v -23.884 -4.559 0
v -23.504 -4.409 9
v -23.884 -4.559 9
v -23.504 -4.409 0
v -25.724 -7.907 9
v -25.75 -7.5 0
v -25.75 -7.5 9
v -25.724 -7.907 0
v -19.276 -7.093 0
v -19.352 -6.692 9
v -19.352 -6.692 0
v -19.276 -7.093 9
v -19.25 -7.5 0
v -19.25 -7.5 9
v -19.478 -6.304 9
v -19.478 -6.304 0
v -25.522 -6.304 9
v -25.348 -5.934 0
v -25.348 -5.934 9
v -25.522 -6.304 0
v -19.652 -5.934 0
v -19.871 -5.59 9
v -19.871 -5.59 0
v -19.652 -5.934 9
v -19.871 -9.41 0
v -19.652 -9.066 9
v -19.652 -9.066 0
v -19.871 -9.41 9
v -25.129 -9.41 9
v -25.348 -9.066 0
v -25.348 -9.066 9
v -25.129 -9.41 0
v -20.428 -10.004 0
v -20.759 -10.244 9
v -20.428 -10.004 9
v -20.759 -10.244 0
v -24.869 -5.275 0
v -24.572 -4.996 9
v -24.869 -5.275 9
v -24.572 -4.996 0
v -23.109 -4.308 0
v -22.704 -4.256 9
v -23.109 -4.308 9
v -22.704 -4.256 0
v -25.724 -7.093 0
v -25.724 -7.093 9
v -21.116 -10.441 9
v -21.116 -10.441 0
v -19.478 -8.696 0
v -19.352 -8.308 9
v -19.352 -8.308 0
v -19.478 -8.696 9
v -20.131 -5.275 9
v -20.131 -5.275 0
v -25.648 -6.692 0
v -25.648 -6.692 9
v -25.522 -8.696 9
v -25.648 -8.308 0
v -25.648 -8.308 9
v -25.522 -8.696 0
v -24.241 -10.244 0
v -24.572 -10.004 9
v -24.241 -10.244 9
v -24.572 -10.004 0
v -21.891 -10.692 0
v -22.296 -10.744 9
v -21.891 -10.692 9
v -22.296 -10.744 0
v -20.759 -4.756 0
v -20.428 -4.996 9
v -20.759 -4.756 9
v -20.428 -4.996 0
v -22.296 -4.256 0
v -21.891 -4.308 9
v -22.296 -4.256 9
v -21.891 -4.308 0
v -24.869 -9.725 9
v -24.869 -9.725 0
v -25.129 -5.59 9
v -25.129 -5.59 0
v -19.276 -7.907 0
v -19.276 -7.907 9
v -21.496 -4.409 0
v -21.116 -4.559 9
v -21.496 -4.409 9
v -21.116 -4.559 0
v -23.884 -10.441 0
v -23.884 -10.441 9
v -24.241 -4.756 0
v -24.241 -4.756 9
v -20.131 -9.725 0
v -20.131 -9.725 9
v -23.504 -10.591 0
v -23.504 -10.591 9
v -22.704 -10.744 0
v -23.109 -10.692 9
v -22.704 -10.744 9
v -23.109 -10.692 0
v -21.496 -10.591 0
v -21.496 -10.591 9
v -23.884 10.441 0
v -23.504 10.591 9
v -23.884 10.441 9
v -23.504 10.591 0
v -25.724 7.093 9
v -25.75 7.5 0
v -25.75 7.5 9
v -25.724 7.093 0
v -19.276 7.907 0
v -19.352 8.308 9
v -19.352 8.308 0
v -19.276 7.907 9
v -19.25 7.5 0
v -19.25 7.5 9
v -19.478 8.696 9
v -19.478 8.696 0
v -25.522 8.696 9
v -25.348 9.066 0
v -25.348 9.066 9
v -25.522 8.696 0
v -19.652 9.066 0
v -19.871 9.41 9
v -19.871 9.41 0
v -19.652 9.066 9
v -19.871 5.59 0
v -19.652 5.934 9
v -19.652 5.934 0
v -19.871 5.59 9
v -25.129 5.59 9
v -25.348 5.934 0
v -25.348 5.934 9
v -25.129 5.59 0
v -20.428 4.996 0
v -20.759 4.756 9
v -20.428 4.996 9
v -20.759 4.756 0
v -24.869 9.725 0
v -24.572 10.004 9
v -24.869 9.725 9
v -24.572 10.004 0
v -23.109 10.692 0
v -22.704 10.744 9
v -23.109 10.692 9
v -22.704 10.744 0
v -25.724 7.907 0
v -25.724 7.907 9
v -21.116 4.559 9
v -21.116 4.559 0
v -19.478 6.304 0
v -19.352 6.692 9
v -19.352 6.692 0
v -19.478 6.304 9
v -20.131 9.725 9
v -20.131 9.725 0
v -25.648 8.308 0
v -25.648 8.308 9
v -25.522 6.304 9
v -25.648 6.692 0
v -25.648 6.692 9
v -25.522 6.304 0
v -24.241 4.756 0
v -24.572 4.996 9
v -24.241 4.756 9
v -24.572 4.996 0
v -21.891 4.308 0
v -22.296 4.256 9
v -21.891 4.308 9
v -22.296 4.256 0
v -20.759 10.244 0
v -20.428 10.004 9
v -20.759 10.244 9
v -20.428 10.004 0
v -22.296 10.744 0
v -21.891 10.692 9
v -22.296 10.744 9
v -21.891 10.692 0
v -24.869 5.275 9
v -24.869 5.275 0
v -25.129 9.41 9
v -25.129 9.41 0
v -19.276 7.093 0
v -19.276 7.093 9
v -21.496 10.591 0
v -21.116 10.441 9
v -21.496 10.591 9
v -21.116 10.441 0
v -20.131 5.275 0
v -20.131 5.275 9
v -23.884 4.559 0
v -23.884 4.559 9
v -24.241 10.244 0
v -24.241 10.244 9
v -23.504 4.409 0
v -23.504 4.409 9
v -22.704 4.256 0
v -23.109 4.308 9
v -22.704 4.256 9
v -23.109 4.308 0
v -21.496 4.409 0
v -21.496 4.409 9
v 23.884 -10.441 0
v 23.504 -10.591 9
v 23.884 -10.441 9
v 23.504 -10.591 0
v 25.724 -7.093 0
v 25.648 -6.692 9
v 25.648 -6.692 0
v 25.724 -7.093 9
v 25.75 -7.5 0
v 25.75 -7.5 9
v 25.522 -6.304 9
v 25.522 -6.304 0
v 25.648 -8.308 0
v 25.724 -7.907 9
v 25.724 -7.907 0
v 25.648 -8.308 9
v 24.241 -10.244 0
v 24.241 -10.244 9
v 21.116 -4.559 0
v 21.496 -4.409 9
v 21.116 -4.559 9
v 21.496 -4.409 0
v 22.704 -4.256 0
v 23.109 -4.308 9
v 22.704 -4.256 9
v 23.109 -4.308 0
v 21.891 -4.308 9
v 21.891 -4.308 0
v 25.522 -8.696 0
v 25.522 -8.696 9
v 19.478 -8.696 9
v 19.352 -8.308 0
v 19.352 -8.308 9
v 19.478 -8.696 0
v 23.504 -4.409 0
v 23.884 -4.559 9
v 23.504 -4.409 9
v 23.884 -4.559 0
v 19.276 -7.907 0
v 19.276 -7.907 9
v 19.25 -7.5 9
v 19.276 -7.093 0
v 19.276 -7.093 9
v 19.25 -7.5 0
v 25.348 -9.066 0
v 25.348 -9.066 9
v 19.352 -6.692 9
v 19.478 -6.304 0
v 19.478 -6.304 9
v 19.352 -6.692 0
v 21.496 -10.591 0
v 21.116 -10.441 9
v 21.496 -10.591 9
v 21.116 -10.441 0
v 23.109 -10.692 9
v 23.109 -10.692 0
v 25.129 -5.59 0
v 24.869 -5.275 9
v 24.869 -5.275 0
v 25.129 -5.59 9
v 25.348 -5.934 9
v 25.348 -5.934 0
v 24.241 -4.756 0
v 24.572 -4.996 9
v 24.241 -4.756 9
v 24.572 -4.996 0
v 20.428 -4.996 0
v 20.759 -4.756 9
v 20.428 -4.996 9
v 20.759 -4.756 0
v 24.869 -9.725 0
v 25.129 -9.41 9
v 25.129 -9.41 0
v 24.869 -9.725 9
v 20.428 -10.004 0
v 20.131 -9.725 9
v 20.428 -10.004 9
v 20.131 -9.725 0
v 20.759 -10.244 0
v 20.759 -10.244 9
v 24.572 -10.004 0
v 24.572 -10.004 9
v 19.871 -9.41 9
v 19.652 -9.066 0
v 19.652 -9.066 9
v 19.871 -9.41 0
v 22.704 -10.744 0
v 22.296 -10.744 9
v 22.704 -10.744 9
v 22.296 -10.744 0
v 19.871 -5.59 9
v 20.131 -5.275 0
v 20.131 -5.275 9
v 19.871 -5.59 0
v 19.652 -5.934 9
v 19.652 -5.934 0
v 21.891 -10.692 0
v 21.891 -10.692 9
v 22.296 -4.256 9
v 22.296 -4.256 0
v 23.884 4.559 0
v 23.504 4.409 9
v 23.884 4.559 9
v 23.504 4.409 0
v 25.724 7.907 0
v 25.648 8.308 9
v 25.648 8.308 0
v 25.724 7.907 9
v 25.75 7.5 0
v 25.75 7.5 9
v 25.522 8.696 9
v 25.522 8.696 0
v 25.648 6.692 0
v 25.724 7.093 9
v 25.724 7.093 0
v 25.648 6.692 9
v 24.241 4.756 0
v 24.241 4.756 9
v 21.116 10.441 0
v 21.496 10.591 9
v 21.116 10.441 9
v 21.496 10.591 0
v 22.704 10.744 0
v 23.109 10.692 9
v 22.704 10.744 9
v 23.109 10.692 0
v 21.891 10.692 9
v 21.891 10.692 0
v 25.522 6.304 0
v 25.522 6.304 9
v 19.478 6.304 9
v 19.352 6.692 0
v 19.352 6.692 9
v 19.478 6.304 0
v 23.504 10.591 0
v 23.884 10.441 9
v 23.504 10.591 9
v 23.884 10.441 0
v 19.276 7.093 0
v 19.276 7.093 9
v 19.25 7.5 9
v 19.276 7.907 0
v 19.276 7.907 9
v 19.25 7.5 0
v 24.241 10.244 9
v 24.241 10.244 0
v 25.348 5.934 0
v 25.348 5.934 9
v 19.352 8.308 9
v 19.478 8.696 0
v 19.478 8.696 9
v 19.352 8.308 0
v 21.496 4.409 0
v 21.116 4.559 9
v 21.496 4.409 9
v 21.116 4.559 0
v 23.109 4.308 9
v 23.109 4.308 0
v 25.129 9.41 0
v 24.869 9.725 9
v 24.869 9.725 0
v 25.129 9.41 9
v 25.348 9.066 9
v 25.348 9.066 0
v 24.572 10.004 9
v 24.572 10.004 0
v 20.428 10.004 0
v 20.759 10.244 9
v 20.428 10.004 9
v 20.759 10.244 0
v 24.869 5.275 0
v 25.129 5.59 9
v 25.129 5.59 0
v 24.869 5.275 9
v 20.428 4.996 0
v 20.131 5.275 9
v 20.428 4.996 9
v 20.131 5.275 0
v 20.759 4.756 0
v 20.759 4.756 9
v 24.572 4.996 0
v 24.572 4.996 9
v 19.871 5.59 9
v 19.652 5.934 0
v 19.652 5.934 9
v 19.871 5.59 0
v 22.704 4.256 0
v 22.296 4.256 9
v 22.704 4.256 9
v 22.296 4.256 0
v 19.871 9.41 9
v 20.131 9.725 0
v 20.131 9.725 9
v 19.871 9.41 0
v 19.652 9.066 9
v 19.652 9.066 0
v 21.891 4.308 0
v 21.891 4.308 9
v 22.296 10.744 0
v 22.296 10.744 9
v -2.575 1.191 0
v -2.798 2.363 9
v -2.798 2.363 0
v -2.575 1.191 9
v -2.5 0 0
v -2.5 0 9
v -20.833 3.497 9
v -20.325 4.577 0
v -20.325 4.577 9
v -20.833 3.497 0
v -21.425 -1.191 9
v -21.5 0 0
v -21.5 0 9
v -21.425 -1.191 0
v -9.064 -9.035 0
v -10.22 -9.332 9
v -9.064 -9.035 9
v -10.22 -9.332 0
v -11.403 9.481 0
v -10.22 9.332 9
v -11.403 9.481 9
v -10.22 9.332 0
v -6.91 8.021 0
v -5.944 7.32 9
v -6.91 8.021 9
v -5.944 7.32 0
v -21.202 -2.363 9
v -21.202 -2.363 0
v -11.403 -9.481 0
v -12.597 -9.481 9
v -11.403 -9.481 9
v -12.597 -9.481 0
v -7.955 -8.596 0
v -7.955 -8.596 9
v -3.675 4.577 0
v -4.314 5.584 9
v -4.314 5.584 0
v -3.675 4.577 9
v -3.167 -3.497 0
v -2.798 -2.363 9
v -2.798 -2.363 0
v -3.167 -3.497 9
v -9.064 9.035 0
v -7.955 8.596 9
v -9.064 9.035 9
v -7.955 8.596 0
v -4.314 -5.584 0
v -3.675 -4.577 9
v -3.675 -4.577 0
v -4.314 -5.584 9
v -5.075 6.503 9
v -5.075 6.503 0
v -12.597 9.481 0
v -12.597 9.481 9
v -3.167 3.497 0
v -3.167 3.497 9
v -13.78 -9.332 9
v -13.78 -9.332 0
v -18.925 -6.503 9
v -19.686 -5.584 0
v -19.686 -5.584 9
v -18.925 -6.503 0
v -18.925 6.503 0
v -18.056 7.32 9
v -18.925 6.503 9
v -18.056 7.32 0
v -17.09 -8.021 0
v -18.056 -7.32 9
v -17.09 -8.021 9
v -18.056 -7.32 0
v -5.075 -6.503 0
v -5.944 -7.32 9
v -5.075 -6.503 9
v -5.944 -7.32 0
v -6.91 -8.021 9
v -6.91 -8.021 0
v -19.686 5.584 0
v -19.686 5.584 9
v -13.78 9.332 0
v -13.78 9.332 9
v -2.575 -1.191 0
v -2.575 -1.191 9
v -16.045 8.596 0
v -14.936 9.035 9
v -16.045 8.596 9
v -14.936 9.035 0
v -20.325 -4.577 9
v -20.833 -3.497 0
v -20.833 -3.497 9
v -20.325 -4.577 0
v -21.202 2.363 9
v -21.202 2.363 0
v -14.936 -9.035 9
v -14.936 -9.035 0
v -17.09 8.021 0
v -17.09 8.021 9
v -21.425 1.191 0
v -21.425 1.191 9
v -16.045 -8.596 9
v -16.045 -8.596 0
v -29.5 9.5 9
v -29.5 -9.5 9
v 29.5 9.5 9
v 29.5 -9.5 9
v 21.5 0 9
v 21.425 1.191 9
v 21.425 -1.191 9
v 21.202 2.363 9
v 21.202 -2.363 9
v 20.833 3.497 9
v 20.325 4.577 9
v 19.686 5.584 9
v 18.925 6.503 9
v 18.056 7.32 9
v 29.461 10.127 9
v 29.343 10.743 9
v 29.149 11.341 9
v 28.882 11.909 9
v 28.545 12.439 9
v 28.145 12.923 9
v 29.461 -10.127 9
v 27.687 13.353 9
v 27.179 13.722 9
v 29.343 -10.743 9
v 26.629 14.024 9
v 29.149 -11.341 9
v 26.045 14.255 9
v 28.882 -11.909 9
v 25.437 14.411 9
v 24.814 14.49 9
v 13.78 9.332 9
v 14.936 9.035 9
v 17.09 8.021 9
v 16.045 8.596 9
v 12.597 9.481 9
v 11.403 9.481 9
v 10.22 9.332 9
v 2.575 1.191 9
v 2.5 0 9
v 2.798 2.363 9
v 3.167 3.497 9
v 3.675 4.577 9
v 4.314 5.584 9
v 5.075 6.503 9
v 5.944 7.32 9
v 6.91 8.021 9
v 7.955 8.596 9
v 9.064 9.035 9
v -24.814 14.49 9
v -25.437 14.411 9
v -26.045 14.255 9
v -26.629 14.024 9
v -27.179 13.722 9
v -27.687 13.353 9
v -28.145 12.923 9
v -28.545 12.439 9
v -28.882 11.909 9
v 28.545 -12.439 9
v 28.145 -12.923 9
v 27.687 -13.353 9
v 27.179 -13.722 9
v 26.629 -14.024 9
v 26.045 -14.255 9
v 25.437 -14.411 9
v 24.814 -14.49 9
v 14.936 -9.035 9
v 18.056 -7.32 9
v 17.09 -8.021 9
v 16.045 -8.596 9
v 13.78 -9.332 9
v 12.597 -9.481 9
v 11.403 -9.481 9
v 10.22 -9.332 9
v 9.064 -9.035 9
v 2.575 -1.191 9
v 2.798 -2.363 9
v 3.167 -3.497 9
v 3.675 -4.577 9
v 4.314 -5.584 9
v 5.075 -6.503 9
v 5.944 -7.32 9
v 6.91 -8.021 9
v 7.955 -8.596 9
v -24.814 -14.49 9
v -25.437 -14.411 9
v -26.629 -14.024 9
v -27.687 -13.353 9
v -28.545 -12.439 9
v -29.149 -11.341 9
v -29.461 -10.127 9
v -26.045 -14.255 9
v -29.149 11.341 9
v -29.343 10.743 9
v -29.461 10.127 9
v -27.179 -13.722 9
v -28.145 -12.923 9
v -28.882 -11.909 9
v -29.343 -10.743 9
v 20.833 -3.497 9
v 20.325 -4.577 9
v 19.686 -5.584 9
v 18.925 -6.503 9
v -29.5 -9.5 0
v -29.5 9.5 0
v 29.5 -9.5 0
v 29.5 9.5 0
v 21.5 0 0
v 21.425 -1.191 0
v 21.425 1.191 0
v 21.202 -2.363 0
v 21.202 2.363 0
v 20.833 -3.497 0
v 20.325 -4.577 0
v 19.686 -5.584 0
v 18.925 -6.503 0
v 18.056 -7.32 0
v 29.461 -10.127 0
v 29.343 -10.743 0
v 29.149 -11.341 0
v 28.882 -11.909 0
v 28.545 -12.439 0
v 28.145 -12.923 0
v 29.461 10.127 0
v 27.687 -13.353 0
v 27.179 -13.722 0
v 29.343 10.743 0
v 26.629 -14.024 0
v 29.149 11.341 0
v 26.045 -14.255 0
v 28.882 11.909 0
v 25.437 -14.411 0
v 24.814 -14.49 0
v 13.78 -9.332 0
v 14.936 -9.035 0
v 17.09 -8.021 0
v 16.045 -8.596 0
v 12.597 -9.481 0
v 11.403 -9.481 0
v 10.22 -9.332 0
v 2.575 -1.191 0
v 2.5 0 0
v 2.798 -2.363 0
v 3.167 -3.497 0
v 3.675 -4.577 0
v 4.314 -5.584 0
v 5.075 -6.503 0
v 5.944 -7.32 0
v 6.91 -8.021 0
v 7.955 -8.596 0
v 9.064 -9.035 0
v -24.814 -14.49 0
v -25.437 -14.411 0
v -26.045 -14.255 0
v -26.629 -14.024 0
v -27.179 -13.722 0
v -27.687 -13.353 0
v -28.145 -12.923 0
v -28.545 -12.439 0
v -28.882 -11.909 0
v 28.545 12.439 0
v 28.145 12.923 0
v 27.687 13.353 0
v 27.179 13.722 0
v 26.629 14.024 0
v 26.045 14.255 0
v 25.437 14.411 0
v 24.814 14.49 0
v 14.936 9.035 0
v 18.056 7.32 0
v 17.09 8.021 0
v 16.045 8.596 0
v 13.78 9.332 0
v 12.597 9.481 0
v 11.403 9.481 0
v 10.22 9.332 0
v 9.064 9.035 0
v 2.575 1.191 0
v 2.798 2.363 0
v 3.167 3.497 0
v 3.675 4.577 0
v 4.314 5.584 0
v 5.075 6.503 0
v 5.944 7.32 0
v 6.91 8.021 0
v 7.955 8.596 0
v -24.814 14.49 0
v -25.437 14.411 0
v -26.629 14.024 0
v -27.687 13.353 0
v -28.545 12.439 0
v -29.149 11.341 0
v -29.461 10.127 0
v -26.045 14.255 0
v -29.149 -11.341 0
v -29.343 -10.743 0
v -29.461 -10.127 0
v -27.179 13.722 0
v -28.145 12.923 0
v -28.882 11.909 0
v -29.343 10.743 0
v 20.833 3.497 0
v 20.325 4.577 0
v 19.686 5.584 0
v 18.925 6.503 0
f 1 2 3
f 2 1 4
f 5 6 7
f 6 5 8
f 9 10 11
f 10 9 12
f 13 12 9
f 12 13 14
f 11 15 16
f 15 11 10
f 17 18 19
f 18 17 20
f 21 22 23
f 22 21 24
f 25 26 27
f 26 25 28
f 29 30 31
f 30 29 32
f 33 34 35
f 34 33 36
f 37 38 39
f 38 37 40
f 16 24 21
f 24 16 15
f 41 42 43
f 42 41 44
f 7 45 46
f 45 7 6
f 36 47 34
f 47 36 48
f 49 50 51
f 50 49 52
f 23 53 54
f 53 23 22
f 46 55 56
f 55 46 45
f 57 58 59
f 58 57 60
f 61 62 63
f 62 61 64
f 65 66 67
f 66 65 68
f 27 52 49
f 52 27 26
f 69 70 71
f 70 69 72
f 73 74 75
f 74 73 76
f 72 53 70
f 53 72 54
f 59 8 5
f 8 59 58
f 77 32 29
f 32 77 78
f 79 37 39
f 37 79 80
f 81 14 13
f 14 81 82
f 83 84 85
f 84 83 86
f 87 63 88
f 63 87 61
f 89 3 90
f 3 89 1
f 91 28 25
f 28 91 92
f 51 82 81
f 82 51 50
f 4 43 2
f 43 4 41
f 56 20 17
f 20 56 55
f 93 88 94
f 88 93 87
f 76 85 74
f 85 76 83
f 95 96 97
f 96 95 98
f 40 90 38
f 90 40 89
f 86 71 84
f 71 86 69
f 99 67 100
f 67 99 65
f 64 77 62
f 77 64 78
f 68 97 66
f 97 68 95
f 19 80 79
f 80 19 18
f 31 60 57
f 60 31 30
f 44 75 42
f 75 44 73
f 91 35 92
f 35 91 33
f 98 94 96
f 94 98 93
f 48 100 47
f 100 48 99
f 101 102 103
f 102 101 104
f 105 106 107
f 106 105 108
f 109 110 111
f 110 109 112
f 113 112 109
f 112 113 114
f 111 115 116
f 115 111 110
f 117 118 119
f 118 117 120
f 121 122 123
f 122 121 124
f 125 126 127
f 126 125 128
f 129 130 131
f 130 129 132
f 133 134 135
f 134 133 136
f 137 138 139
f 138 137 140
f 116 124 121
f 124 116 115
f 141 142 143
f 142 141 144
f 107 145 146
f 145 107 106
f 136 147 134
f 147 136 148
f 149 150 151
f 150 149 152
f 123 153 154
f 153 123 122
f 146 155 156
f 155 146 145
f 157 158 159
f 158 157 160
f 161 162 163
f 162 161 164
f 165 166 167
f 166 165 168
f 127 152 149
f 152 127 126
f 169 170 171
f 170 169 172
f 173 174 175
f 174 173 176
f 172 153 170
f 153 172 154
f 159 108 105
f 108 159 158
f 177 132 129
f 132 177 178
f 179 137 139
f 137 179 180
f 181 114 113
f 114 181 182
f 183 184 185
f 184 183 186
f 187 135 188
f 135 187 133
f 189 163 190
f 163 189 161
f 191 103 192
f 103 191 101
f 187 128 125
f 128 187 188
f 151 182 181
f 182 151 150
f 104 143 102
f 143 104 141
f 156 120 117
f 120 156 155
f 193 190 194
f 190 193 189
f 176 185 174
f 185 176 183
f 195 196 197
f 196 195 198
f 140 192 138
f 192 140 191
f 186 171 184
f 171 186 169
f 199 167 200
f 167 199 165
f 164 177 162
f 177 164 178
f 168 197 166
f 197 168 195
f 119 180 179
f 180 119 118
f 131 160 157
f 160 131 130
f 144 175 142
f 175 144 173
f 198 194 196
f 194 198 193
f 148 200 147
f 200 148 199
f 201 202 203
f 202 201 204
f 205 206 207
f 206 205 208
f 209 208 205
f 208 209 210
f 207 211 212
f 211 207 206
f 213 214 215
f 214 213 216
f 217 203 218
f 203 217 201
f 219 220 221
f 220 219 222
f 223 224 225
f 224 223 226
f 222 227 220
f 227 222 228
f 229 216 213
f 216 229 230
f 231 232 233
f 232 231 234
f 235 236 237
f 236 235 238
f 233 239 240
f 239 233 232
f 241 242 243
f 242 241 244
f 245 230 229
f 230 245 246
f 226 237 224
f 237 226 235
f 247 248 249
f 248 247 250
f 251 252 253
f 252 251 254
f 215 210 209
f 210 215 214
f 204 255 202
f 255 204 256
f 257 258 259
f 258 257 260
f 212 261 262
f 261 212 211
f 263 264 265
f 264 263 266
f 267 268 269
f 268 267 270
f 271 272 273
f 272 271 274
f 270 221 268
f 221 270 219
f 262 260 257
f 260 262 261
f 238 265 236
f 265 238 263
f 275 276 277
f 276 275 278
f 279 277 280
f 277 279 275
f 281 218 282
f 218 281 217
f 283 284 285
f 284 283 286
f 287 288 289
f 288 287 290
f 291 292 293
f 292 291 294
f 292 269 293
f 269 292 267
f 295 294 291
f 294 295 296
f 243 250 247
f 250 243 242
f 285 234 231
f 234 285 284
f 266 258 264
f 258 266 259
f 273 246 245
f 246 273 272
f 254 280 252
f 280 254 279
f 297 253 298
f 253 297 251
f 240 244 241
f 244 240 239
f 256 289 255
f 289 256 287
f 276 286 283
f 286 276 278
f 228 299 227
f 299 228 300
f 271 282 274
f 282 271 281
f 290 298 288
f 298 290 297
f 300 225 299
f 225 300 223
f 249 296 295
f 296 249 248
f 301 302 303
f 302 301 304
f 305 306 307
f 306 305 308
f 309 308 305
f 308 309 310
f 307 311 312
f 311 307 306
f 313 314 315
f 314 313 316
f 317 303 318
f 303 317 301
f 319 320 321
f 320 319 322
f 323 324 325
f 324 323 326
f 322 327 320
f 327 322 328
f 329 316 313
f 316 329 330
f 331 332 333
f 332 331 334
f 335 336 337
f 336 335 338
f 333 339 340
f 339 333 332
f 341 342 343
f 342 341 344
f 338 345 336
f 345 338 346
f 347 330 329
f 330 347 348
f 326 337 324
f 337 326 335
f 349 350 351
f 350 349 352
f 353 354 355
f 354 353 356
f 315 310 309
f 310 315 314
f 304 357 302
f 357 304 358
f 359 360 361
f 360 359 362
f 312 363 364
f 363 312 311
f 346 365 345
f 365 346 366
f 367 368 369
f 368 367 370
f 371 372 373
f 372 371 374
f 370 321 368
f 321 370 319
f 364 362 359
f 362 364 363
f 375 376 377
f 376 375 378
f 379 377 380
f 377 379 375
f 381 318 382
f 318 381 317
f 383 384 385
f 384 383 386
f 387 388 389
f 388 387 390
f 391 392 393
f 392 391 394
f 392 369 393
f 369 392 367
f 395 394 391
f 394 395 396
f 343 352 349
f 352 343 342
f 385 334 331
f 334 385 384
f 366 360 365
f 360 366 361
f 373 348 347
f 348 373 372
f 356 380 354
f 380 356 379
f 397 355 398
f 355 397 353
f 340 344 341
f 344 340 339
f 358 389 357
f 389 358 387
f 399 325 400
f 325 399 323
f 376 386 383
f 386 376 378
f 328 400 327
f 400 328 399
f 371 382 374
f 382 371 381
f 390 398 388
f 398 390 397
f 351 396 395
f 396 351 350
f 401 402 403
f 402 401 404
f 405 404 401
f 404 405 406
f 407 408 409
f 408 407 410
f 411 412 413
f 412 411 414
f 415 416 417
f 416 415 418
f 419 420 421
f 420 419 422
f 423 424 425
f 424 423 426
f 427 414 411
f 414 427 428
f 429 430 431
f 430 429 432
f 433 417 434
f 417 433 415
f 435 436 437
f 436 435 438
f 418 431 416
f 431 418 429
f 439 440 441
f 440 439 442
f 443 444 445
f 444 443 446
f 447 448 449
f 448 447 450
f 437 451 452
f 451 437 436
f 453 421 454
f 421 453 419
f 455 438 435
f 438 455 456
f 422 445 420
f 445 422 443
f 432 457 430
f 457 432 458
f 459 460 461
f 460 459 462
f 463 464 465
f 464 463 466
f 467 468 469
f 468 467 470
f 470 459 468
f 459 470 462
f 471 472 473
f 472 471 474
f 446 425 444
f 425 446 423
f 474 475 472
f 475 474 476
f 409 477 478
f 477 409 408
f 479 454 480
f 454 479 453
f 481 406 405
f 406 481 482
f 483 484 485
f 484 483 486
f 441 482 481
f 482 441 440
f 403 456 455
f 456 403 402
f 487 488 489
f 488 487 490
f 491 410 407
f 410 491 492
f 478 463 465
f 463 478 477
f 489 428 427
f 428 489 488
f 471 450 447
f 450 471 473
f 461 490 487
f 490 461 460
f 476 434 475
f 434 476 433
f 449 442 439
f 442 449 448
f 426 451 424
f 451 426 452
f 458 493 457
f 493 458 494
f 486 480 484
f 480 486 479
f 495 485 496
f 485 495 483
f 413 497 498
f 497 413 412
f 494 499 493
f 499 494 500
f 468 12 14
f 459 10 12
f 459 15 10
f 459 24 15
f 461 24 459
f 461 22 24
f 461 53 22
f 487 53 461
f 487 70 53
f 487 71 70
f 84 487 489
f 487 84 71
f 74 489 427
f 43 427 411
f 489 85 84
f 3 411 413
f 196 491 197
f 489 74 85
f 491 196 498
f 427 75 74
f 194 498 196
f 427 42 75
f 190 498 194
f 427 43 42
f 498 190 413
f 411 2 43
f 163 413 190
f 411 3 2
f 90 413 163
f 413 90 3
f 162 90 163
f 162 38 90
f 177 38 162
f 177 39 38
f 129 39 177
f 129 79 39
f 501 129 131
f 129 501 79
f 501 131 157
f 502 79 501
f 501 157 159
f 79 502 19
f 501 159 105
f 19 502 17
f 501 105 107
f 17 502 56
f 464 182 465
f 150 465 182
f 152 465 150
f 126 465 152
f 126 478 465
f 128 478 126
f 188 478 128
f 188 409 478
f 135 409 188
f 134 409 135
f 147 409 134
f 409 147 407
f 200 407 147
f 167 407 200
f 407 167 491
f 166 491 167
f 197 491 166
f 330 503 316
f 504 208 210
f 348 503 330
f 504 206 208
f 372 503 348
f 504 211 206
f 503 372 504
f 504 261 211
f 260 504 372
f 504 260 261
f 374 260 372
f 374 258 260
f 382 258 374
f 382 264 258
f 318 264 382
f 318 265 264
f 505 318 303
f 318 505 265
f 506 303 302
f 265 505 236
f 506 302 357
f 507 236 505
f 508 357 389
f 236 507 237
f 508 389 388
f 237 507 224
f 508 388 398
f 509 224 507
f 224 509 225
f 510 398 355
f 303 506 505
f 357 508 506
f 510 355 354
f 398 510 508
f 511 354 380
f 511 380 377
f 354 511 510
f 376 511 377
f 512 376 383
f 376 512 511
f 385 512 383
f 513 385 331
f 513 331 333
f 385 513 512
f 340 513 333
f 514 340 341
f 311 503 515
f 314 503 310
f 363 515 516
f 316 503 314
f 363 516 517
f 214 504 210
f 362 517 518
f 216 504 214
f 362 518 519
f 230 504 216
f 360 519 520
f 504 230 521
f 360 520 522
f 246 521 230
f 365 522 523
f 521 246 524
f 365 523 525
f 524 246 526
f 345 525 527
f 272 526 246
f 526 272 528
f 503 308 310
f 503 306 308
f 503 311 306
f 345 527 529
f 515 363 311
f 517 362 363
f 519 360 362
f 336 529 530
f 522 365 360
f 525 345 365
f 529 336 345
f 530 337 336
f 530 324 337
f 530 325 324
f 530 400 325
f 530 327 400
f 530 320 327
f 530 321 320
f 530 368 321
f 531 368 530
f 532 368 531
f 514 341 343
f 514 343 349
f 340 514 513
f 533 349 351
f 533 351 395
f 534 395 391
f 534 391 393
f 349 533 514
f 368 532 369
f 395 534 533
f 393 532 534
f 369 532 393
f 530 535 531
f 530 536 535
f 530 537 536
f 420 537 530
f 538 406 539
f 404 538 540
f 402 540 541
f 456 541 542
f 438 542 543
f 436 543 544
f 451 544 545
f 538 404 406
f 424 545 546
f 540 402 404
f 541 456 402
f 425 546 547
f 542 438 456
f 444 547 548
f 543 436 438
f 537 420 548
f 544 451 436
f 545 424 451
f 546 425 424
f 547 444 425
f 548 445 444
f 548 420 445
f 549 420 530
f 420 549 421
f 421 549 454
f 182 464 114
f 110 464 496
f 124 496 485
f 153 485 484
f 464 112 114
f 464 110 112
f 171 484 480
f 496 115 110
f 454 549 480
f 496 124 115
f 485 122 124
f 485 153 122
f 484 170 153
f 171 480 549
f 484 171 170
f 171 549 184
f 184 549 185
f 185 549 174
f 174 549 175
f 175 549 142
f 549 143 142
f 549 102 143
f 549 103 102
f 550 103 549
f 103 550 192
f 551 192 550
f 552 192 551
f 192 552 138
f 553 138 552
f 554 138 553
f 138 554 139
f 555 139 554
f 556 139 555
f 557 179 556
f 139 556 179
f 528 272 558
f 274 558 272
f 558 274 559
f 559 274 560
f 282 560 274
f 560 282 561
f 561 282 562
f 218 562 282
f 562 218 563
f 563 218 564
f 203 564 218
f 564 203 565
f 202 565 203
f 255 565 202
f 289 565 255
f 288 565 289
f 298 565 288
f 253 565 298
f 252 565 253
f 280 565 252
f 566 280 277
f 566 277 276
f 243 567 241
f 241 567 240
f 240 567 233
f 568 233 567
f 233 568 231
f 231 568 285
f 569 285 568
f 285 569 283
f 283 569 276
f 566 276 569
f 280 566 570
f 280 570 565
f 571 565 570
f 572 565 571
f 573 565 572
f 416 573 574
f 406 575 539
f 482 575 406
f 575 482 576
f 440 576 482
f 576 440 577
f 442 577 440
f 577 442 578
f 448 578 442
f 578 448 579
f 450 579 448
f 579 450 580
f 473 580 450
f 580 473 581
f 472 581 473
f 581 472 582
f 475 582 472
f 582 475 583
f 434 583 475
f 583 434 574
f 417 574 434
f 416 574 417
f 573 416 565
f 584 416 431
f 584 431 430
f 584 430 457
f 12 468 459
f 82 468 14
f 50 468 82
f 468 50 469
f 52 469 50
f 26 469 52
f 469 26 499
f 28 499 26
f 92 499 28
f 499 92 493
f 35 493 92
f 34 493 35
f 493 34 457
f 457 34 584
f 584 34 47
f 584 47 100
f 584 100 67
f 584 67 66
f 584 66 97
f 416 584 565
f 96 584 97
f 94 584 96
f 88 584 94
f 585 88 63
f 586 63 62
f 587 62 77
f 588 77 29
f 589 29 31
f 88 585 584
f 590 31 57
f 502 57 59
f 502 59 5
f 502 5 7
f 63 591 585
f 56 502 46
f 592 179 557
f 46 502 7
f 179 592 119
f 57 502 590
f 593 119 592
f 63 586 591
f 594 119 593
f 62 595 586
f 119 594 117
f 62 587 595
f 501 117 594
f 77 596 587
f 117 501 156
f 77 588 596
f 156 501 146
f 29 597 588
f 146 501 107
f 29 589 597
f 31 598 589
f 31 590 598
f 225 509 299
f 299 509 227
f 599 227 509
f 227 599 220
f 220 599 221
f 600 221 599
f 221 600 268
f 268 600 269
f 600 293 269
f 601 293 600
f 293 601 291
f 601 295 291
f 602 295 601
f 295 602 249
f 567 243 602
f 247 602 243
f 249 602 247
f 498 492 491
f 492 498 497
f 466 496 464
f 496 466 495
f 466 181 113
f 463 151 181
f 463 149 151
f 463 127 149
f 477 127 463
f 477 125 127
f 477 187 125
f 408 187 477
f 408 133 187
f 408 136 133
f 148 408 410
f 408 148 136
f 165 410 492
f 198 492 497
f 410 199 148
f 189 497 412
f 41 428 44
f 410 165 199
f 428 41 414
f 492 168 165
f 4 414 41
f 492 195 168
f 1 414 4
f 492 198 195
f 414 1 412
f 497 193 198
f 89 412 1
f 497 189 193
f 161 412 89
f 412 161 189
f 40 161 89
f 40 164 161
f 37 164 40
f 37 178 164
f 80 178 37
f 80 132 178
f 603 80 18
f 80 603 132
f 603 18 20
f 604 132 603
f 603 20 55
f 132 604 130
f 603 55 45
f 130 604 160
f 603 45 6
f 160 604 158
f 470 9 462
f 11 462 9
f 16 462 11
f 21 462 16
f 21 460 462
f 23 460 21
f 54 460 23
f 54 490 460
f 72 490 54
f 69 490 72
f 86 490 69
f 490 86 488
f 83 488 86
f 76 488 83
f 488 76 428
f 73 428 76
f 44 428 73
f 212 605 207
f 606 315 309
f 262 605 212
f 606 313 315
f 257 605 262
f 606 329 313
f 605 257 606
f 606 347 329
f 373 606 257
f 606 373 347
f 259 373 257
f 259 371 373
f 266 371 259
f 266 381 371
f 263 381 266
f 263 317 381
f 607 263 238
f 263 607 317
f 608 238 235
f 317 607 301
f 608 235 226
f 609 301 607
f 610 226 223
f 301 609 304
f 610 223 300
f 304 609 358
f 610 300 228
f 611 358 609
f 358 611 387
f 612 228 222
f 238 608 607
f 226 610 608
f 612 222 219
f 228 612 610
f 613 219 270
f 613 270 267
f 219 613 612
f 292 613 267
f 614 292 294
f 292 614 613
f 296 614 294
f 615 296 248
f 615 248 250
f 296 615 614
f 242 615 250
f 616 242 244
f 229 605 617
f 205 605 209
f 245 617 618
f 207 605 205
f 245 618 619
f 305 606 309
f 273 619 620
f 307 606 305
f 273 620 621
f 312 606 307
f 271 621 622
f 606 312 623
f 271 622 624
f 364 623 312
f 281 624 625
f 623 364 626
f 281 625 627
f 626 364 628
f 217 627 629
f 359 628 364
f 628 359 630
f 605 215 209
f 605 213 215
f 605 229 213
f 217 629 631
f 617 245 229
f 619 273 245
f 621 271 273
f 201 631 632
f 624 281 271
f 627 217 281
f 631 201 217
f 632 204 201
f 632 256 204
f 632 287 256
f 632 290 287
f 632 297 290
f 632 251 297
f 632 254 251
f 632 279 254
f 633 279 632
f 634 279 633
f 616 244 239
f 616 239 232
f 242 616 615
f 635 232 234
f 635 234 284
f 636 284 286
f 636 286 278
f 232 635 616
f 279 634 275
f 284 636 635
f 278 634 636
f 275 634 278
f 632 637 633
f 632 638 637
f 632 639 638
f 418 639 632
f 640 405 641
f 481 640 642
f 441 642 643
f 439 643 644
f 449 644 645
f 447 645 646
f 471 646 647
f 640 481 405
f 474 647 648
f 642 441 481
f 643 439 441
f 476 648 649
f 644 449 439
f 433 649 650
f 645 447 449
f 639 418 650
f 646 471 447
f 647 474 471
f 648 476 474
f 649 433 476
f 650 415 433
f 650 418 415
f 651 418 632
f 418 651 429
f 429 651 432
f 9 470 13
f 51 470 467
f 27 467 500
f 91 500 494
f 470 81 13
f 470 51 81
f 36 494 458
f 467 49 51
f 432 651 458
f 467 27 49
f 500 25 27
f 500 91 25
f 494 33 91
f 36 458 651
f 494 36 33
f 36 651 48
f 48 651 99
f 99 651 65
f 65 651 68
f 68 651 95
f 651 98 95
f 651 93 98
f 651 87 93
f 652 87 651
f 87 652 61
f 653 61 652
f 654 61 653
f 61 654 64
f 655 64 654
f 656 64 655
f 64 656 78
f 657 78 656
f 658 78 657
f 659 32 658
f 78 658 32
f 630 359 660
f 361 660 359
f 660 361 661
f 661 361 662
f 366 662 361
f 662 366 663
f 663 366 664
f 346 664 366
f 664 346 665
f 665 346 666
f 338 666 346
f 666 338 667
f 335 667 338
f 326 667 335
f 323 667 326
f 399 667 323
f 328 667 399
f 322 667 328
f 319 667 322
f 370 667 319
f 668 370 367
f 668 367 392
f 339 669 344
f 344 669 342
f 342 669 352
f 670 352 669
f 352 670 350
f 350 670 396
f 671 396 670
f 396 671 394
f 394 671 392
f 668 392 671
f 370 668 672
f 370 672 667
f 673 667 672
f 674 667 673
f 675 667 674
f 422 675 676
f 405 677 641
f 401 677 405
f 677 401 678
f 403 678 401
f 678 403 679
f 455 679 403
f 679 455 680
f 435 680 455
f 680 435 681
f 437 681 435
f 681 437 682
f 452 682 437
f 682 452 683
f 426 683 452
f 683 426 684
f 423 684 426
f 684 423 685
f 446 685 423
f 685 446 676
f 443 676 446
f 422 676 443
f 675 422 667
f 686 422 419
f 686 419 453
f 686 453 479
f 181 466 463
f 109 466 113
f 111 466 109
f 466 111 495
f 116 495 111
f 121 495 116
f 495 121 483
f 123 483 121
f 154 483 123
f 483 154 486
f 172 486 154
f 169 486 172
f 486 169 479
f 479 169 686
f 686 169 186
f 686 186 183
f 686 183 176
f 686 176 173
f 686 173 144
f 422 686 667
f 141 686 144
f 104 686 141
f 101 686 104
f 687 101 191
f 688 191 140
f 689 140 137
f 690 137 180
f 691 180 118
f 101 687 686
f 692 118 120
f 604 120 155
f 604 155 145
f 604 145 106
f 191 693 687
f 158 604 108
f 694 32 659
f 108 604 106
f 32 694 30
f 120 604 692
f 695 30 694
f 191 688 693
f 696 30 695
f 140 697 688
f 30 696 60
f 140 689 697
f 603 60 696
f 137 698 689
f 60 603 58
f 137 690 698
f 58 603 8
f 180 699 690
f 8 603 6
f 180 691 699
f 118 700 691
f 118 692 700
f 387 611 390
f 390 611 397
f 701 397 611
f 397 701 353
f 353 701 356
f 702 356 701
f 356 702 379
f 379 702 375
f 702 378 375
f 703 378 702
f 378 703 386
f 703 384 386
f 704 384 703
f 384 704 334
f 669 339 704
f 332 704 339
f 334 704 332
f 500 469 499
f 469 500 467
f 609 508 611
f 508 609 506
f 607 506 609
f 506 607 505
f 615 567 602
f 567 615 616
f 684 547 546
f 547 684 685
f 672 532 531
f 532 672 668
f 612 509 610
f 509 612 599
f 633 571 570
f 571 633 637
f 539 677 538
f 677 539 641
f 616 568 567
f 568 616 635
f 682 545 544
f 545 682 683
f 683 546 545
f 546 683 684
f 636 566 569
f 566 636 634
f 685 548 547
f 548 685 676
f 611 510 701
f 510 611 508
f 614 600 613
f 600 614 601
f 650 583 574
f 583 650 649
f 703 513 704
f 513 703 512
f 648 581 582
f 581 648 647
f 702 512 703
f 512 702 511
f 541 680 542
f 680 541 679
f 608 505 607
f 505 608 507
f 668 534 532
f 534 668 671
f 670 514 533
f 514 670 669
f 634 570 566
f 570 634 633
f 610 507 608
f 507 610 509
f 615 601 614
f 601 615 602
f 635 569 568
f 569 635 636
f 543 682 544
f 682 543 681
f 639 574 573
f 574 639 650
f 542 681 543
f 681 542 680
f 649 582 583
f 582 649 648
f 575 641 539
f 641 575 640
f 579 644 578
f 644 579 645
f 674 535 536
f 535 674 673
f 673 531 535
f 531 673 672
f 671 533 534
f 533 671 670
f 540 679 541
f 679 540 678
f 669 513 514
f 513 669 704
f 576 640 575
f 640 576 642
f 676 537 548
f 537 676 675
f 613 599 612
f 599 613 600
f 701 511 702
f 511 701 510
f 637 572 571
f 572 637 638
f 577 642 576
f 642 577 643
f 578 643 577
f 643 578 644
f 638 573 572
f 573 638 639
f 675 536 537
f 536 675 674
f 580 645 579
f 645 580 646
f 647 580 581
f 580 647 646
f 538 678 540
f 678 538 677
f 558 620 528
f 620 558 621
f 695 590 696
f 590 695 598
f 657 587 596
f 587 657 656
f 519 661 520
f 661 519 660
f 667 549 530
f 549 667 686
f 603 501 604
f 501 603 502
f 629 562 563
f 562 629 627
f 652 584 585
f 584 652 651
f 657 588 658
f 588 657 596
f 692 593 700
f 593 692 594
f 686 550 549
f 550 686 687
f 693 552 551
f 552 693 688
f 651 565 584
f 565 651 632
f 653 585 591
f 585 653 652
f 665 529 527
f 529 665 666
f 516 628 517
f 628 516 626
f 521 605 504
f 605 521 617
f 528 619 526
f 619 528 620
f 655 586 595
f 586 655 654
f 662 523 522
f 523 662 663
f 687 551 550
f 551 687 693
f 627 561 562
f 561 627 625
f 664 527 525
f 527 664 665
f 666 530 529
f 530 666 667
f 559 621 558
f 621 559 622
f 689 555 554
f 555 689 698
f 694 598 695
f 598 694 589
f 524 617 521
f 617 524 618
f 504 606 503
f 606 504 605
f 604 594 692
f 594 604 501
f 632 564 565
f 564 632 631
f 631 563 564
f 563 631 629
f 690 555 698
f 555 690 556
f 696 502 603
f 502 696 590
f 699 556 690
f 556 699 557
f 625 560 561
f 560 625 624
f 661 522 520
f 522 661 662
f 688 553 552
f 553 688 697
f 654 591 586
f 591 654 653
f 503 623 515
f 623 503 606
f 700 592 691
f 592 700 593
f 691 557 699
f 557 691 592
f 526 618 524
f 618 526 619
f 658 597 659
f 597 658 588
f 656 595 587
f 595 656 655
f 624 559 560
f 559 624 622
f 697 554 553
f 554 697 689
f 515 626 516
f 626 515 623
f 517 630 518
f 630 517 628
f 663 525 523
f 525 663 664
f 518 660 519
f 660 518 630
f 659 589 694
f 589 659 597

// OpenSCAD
$fn = 50;

difference() {
	union() {
		hull() {
			translate(v = [-24.5, 9.5, 0]) {
				cylinder(h = 9, r = 5);
			}
			translate(v = [24.5, 9.5, 0]) {
				cylinder(h = 9, r = 5);
			}
			translate(v = [-24.5, -9.5, 0]) {
				cylinder(h = 9, r = 5);
			}
			translate(v = [24.5, -9.5, 0]) {
				cylinder(h = 9, r = 5);
			}
		}
	}
	union() {
		translate(v = [-22.5, -7.5, -100.0]) {
			cylinder(h = 200, r = 3.25);
		}
		translate(v = [-22.5, 7.5, -100.0]) {
			cylinder(h = 200, r = 3.25);
		}
		translate(v = [22.5, -7.5, -100.0]) {
			cylinder(h = 200, r = 3.25);
		}
		translate(v = [22.5, 7.5, -100.0]) {
			cylinder(h = 200, r = 3.25);
		}
		translate(v = [-22.5, -7.5, -100.0]) {
			cylinder(h = 200, r = 1.8);
		}
		translate(v = [-22.5, 7.5, -100.0]) {
			cylinder(h = 200, r = 1.8);
		}
		translate(v = [22.5, -7.5, -100.0]) {
			cylinder(h = 200, r = 1.8);
		}
		translate(v = [22.5, 7.5, -100.0]) {
			cylinder(h = 200, r = 1.8);
		}
		translate(v = [-12.0, 0, 0.0]) {
			cylinder(h = 9, r = 9.5);
		}
		translate(v = [12.0, 0, 0.0]) {
			cylinder(h = 9, r = 9.5);
		}
	}
}
